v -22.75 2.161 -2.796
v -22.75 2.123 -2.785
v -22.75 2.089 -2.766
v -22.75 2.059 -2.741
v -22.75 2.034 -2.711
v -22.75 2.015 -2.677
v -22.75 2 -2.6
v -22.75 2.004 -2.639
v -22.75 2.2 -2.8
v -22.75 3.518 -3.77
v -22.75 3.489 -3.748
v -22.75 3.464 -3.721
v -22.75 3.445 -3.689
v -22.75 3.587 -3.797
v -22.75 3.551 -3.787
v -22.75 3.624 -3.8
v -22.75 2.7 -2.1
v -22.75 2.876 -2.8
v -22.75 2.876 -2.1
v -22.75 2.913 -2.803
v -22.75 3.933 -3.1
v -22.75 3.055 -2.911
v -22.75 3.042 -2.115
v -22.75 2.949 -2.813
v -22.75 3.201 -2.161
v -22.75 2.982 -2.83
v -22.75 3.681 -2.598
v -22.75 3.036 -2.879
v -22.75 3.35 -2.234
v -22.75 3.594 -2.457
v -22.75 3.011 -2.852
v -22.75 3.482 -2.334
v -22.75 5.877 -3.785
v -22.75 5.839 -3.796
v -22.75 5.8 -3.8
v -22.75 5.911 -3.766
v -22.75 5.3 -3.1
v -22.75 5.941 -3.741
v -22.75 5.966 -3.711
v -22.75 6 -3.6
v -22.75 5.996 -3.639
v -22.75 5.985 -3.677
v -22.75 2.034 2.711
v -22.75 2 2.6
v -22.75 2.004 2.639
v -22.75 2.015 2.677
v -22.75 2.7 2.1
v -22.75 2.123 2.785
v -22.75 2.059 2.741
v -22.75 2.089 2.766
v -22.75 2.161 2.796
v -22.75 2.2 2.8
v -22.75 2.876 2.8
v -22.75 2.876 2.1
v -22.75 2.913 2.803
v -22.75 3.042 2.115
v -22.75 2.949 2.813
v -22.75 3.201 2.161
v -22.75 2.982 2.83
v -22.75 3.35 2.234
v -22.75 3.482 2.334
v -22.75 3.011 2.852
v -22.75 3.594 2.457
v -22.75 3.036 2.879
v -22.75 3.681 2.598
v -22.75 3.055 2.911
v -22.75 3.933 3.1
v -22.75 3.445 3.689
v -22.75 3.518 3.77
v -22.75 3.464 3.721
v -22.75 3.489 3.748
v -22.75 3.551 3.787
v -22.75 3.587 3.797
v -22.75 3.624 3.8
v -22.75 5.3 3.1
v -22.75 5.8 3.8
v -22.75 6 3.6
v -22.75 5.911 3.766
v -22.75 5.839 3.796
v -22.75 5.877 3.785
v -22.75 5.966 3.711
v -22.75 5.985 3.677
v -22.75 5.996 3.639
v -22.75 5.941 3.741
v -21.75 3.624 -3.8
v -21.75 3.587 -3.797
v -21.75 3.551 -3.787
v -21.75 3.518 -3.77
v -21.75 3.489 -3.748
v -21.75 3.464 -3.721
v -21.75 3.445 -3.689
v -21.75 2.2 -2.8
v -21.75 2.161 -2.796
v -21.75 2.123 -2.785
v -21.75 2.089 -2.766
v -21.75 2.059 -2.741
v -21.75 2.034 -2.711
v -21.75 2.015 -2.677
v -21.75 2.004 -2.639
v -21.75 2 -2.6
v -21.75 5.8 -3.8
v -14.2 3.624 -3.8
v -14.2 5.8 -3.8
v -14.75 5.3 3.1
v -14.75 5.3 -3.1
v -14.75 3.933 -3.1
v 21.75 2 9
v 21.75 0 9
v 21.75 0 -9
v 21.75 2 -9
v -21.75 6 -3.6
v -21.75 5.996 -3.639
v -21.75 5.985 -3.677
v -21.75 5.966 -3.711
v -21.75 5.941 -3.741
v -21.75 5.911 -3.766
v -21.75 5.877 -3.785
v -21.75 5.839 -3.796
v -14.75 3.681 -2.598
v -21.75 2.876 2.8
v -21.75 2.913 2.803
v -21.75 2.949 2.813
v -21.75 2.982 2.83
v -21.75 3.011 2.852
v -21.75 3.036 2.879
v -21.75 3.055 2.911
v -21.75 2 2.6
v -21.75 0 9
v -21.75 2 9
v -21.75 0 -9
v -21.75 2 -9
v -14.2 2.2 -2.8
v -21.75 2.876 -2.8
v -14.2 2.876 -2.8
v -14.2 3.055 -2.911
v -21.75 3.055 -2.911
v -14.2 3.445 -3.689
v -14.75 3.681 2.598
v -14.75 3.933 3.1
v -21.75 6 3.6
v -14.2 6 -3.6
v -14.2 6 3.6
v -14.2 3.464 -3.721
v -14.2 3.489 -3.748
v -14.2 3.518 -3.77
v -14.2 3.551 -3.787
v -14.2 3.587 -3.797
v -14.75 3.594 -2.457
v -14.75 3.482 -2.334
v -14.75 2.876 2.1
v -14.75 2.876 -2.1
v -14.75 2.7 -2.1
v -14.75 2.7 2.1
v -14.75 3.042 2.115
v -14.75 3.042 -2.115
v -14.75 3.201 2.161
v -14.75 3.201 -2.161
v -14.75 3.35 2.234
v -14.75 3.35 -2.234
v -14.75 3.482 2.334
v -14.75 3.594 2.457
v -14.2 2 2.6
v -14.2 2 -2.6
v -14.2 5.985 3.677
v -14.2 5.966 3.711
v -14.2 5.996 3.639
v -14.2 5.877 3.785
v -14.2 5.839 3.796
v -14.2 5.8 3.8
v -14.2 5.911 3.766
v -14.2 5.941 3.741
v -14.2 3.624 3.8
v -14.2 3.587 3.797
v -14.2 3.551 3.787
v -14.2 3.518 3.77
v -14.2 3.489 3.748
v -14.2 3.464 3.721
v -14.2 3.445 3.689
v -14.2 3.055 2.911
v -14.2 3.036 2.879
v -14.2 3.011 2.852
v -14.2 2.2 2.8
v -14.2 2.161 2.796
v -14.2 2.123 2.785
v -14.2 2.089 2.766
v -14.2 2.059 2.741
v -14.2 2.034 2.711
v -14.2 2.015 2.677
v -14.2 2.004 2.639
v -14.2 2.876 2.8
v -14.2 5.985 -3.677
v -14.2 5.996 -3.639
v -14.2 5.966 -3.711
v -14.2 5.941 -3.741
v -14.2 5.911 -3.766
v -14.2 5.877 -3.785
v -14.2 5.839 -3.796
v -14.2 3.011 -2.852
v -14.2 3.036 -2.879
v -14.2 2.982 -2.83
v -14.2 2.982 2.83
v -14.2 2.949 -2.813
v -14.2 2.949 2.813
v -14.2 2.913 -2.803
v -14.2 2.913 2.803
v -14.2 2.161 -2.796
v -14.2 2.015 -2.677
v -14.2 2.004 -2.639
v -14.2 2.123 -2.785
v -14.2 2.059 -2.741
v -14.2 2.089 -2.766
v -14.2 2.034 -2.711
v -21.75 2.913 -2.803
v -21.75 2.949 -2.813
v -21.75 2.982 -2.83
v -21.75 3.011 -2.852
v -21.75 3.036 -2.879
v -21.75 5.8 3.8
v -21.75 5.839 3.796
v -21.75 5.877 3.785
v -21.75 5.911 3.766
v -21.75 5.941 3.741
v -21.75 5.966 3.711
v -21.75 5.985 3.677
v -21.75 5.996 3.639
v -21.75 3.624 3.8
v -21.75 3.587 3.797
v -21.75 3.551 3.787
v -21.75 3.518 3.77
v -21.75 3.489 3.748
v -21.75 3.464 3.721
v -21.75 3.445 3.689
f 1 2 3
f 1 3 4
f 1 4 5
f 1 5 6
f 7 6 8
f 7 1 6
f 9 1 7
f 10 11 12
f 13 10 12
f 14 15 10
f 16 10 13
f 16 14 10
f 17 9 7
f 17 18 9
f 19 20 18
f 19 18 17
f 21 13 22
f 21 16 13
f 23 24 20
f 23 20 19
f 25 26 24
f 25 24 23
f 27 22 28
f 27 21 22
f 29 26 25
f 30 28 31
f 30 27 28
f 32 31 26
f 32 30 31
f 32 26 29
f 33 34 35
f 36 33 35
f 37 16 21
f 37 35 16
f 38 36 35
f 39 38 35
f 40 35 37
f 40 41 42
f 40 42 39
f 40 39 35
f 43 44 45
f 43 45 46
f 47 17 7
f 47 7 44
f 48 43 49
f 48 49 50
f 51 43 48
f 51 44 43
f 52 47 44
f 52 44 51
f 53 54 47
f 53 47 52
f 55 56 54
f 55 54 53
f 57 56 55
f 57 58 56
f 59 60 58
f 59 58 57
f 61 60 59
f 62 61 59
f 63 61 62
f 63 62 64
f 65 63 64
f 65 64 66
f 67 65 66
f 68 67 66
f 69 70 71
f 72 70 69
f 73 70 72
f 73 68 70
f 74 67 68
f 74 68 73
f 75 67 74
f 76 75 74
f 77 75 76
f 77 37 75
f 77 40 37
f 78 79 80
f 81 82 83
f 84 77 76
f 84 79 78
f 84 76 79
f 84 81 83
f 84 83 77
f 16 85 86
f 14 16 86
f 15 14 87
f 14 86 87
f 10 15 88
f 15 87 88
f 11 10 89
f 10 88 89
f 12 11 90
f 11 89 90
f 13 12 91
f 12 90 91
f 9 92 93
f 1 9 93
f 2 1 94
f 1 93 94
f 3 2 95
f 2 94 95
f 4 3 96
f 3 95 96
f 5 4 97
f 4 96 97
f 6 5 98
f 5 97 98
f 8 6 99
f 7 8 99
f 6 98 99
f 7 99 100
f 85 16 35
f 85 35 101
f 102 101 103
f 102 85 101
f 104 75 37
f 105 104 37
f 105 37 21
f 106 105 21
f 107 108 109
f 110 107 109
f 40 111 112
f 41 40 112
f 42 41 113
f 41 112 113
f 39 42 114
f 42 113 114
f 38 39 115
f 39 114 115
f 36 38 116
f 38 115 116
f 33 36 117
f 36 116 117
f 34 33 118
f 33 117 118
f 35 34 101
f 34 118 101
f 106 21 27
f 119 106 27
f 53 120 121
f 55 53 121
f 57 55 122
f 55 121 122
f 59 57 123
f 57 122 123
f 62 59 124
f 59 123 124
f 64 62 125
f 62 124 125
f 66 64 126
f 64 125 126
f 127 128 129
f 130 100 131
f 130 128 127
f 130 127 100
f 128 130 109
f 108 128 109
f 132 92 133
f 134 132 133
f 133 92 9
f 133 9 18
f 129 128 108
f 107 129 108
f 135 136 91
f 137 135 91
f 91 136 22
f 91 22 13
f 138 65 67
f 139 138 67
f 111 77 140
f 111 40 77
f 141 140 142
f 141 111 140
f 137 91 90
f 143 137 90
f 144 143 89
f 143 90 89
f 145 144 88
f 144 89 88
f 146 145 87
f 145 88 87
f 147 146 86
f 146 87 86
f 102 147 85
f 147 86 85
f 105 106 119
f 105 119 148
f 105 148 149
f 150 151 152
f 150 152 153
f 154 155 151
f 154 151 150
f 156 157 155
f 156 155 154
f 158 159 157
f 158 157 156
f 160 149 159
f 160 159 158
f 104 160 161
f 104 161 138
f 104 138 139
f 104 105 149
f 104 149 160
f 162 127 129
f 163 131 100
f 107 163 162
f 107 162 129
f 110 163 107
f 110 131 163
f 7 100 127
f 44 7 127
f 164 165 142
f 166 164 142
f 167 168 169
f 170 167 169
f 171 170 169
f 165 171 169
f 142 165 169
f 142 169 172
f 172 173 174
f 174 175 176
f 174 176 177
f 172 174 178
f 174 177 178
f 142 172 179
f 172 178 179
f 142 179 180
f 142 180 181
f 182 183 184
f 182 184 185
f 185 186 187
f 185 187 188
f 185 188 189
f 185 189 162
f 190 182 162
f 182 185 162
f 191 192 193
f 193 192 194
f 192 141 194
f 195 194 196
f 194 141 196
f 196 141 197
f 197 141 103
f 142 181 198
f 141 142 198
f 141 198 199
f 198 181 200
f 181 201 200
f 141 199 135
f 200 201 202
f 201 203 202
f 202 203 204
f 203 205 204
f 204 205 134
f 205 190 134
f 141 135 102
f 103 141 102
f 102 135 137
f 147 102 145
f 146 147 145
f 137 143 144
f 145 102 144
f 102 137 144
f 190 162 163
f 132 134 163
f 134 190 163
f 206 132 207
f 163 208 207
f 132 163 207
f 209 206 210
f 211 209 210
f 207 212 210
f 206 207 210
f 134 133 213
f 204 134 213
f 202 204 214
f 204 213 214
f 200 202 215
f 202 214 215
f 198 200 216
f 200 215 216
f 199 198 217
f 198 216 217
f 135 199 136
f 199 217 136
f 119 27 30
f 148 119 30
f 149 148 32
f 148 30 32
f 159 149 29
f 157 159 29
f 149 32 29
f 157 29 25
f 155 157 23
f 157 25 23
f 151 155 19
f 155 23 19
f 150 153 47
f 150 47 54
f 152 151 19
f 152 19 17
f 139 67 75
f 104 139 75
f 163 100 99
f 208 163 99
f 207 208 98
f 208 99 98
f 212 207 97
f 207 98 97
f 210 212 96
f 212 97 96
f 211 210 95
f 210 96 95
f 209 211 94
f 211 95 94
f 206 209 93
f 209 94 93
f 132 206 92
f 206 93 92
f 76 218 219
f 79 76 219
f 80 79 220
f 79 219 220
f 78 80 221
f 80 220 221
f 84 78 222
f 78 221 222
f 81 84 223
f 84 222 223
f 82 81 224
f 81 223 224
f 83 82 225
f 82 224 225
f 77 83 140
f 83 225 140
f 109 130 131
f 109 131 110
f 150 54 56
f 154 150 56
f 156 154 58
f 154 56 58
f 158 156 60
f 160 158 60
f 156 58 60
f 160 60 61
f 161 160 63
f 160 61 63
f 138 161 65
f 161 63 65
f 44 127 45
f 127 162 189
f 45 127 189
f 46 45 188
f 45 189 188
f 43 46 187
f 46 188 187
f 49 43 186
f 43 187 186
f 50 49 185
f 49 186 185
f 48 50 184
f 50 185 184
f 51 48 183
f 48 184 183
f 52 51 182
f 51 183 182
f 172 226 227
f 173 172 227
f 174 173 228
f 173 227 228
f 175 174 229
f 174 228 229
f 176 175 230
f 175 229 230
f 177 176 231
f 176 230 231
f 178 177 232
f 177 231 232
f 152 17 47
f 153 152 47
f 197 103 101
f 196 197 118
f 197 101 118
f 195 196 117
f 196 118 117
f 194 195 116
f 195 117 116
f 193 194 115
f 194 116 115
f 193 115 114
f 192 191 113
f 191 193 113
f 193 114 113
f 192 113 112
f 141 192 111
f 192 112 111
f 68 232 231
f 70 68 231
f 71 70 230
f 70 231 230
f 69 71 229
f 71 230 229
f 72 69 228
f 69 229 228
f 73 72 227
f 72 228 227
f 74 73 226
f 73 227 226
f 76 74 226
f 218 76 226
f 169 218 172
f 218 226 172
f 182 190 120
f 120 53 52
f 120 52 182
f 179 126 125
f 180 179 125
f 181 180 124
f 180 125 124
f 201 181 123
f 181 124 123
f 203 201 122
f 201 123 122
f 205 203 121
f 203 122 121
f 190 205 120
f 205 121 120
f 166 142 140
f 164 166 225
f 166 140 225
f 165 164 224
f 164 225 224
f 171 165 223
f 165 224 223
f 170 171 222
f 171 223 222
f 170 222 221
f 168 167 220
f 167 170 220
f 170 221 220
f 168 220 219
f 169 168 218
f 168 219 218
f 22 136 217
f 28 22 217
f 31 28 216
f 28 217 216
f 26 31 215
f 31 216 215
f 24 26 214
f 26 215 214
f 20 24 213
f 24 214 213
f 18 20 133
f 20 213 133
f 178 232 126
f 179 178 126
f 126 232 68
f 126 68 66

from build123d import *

# Parameters (mm, degrees)
SKETCH1_W           = 43.5
SKETCH1_H           = 18
BOSS_EXTRUDE1_DEPTH = 2
SKETCH2_W           = 7.549869754
SKETCH2_H           = 7.6
BOSS_EXTRUDE2_DEPTH = 4
BOSS_EXTRUDE3_DEPTH = 1
CUT_EXTRUDE1_DEPTH  = 15
CUT_EXTRUDE2_DEPTH  = 8


with BuildPart() as part:
    # Sketch1 → Boss-Extrude1 (new body)
    with BuildSketch(Plane(origin=(0, 0, 0), x_dir=(1, 0, 0), z_dir=(0, 1, 0))):
        Rectangle(SKETCH1_W, SKETCH1_H)
    extrude(amount=BOSS_EXTRUDE1_DEPTH)

    # Sketch2 → Boss-Extrude2 (add)
    with BuildSketch(Plane(origin=(0, 2, 0), x_dir=(1, 0, 0), z_dir=(0, 1, 0))):
        with Locations((-17.975065123, 0)):
            Rectangle(SKETCH2_W, SKETCH2_H)
    extrude(amount=BOSS_EXTRUDE2_DEPTH)

    # Sketch3 → Boss-Extrude3 (add)
    with BuildSketch(Plane.ZY.offset(21.75)):
        with BuildLine():
            ThreePointArc((-3.8, 3.623606798), (-3.770130162, 3.518460575), (-3.689442719, 3.44472136))
            Line((-3.689442719, 3.44472136), (-2.910557281, 3.05527864))
            ThreePointArc((-2.910557281, 3.05527864), (-2.829869838, 2.981539425), (-2.8, 2.876393202))
            Line((-2.8, 2.876393202), (-2.8, 2.2))
            ThreePointArc((-2.8, 2.2), (-2.741421356, 2.058578644), (-2.6, 2))
            Line((-2.6, 2), (2.6, 2))
            ThreePointArc((2.6, 2), (2.741421356, 2.058578644), (2.8, 2.2))
            Line((2.8, 2.2), (2.8, 2.876393202))
            ThreePointArc((2.8, 2.876393202), (2.829869838, 2.981539425), (2.910557281, 3.05527864))
            Line((2.910557281, 3.05527864), (3.689442719, 3.44472136))
            ThreePointArc((3.689442719, 3.44472136), (3.770130162, 3.518460575), (3.8, 3.623606798))
            Line((3.8, 3.623606798), (3.8, 5.8))
            ThreePointArc((3.8, 5.8), (3.741421356, 5.941421356), (3.6, 6))
            Line((3.6, 6), (-3.6, 6))
            ThreePointArc((-3.6, 6), (-3.741421356, 5.941421356), (-3.8, 5.8))
            Line((-3.8, 5.8), (-3.8, 3.623606798))
        make_face()
    extrude(amount=BOSS_EXTRUDE3_DEPTH)

    # Sketch6 → Cut-Extrude1 (cut)
    with BuildSketch(Plane.ZY.offset(22.75)):
        with BuildLine():
            Line((-2.910557281, 3.05527864), (-3.689442719, 3.44472136))
            ThreePointArc((-3.689442719, 3.44472136), (-3.770130162, 3.518460575), (-3.8, 3.623606798))
            Line((-3.8, 3.623606798), (-3.8, 2))
            Line((-3.8, 2), (-2.6, 2))
            ThreePointArc((-2.6, 2), (-2.741421356, 2.058578644), (-2.8, 2.2))
            Line((-2.8, 2.2), (-2.8, 2.876393202))
            ThreePointArc((-2.8, 2.876393202), (-3.170130162, 2.77124698), (-2.910557281, 3.05527864))
        make_face()
        with BuildLine():
            Line((-3.8, 6), (-3.8, 5.8))
            ThreePointArc((-3.8, 5.8), (-3.741421356, 5.941421356), (-3.6, 6))
            Line((-3.6, 6), (-3.8, 6))
        make_face()
        with BuildLine():
            ThreePointArc((-2.8, 2.876393202), (-2.829869838, 2.981539425), (-2.910557281, 3.05527864))
            ThreePointArc((-2.910557281, 3.05527864), (-3.170130162, 2.77124698), (-2.8, 2.876393202))
        make_face()
        with BuildLine():
            ThreePointArc((2.910557281, 3.05527864), (2.829869838, 2.981539425), (2.8, 2.876393202))
            ThreePointArc((2.8, 2.876393202), (3, 2.676393202), (3.2, 2.876393202))
            ThreePointArc((3.2, 2.876393202), (3.105146222, 3.046523364), (2.910557281, 3.05527864))
        make_face()
        with BuildLine():
            ThreePointArc((2.8, 2.2), (2.741421356, 2.058578644), (2.6, 2))
            Line((2.6, 2), (3.8, 2))
            Line((3.8, 2), (3.8, 3.623606798))
            ThreePointArc((3.8, 3.623606798), (3.770130162, 3.518460575), (3.689442719, 3.44472136))
            Line((3.689442719, 3.44472136), (2.910557281, 3.05527864))
            ThreePointArc((2.910557281, 3.05527864), (3.105146222, 3.046523364), (3.2, 2.876393202))
            ThreePointArc((3.2, 2.876393202), (3, 2.676393202), (2.8, 2.876393202))
            Line((2.8, 2.876393202), (2.8, 2.2))
        make_face()
        with BuildLine():
            Line((3.8, 6), (3.6, 6))
            ThreePointArc((3.6, 6), (3.741421356, 5.941421356), (3.8, 5.8))
            Line((3.8, 5.8), (3.8, 6))
        make_face()
    extrude(amount=-CUT_EXTRUDE1_DEPTH, mode=Mode.SUBTRACT)

    # Sketch7 → Cut-Extrude2 (cut)
    with BuildSketch(Plane.ZY.offset(22.75)):
        with BuildLine():
            Line((3.1, 5.3), (-3.1, 5.3))
            Line((-3.1, 5.3), (-3.1, 3.932623792))
            Line((-3.1, 3.932623792), (-2.597507764, 3.681377674))
            ThreePointArc((-2.597507764, 3.681377674), (-2.234414272, 3.349551203), (-2.1, 2.876393202))
            Line((-2.1, 2.876393202), (-2.1, 2.7))
            Line((-2.1, 2.7), (2.1, 2.7))
            Line((2.1, 2.7), (2.1, 2.876393202))
            ThreePointArc((2.1, 2.876393202), (2.234414272, 3.349551203), (2.597507764, 3.681377674))
            Line((2.597507764, 3.681377674), (3.1, 3.932623792))
            Line((3.1, 3.932623792), (3.1, 5.3))
        make_face()
    extrude(amount=-CUT_EXTRUDE2_DEPTH, mode=Mode.SUBTRACT)


solid = part.part
